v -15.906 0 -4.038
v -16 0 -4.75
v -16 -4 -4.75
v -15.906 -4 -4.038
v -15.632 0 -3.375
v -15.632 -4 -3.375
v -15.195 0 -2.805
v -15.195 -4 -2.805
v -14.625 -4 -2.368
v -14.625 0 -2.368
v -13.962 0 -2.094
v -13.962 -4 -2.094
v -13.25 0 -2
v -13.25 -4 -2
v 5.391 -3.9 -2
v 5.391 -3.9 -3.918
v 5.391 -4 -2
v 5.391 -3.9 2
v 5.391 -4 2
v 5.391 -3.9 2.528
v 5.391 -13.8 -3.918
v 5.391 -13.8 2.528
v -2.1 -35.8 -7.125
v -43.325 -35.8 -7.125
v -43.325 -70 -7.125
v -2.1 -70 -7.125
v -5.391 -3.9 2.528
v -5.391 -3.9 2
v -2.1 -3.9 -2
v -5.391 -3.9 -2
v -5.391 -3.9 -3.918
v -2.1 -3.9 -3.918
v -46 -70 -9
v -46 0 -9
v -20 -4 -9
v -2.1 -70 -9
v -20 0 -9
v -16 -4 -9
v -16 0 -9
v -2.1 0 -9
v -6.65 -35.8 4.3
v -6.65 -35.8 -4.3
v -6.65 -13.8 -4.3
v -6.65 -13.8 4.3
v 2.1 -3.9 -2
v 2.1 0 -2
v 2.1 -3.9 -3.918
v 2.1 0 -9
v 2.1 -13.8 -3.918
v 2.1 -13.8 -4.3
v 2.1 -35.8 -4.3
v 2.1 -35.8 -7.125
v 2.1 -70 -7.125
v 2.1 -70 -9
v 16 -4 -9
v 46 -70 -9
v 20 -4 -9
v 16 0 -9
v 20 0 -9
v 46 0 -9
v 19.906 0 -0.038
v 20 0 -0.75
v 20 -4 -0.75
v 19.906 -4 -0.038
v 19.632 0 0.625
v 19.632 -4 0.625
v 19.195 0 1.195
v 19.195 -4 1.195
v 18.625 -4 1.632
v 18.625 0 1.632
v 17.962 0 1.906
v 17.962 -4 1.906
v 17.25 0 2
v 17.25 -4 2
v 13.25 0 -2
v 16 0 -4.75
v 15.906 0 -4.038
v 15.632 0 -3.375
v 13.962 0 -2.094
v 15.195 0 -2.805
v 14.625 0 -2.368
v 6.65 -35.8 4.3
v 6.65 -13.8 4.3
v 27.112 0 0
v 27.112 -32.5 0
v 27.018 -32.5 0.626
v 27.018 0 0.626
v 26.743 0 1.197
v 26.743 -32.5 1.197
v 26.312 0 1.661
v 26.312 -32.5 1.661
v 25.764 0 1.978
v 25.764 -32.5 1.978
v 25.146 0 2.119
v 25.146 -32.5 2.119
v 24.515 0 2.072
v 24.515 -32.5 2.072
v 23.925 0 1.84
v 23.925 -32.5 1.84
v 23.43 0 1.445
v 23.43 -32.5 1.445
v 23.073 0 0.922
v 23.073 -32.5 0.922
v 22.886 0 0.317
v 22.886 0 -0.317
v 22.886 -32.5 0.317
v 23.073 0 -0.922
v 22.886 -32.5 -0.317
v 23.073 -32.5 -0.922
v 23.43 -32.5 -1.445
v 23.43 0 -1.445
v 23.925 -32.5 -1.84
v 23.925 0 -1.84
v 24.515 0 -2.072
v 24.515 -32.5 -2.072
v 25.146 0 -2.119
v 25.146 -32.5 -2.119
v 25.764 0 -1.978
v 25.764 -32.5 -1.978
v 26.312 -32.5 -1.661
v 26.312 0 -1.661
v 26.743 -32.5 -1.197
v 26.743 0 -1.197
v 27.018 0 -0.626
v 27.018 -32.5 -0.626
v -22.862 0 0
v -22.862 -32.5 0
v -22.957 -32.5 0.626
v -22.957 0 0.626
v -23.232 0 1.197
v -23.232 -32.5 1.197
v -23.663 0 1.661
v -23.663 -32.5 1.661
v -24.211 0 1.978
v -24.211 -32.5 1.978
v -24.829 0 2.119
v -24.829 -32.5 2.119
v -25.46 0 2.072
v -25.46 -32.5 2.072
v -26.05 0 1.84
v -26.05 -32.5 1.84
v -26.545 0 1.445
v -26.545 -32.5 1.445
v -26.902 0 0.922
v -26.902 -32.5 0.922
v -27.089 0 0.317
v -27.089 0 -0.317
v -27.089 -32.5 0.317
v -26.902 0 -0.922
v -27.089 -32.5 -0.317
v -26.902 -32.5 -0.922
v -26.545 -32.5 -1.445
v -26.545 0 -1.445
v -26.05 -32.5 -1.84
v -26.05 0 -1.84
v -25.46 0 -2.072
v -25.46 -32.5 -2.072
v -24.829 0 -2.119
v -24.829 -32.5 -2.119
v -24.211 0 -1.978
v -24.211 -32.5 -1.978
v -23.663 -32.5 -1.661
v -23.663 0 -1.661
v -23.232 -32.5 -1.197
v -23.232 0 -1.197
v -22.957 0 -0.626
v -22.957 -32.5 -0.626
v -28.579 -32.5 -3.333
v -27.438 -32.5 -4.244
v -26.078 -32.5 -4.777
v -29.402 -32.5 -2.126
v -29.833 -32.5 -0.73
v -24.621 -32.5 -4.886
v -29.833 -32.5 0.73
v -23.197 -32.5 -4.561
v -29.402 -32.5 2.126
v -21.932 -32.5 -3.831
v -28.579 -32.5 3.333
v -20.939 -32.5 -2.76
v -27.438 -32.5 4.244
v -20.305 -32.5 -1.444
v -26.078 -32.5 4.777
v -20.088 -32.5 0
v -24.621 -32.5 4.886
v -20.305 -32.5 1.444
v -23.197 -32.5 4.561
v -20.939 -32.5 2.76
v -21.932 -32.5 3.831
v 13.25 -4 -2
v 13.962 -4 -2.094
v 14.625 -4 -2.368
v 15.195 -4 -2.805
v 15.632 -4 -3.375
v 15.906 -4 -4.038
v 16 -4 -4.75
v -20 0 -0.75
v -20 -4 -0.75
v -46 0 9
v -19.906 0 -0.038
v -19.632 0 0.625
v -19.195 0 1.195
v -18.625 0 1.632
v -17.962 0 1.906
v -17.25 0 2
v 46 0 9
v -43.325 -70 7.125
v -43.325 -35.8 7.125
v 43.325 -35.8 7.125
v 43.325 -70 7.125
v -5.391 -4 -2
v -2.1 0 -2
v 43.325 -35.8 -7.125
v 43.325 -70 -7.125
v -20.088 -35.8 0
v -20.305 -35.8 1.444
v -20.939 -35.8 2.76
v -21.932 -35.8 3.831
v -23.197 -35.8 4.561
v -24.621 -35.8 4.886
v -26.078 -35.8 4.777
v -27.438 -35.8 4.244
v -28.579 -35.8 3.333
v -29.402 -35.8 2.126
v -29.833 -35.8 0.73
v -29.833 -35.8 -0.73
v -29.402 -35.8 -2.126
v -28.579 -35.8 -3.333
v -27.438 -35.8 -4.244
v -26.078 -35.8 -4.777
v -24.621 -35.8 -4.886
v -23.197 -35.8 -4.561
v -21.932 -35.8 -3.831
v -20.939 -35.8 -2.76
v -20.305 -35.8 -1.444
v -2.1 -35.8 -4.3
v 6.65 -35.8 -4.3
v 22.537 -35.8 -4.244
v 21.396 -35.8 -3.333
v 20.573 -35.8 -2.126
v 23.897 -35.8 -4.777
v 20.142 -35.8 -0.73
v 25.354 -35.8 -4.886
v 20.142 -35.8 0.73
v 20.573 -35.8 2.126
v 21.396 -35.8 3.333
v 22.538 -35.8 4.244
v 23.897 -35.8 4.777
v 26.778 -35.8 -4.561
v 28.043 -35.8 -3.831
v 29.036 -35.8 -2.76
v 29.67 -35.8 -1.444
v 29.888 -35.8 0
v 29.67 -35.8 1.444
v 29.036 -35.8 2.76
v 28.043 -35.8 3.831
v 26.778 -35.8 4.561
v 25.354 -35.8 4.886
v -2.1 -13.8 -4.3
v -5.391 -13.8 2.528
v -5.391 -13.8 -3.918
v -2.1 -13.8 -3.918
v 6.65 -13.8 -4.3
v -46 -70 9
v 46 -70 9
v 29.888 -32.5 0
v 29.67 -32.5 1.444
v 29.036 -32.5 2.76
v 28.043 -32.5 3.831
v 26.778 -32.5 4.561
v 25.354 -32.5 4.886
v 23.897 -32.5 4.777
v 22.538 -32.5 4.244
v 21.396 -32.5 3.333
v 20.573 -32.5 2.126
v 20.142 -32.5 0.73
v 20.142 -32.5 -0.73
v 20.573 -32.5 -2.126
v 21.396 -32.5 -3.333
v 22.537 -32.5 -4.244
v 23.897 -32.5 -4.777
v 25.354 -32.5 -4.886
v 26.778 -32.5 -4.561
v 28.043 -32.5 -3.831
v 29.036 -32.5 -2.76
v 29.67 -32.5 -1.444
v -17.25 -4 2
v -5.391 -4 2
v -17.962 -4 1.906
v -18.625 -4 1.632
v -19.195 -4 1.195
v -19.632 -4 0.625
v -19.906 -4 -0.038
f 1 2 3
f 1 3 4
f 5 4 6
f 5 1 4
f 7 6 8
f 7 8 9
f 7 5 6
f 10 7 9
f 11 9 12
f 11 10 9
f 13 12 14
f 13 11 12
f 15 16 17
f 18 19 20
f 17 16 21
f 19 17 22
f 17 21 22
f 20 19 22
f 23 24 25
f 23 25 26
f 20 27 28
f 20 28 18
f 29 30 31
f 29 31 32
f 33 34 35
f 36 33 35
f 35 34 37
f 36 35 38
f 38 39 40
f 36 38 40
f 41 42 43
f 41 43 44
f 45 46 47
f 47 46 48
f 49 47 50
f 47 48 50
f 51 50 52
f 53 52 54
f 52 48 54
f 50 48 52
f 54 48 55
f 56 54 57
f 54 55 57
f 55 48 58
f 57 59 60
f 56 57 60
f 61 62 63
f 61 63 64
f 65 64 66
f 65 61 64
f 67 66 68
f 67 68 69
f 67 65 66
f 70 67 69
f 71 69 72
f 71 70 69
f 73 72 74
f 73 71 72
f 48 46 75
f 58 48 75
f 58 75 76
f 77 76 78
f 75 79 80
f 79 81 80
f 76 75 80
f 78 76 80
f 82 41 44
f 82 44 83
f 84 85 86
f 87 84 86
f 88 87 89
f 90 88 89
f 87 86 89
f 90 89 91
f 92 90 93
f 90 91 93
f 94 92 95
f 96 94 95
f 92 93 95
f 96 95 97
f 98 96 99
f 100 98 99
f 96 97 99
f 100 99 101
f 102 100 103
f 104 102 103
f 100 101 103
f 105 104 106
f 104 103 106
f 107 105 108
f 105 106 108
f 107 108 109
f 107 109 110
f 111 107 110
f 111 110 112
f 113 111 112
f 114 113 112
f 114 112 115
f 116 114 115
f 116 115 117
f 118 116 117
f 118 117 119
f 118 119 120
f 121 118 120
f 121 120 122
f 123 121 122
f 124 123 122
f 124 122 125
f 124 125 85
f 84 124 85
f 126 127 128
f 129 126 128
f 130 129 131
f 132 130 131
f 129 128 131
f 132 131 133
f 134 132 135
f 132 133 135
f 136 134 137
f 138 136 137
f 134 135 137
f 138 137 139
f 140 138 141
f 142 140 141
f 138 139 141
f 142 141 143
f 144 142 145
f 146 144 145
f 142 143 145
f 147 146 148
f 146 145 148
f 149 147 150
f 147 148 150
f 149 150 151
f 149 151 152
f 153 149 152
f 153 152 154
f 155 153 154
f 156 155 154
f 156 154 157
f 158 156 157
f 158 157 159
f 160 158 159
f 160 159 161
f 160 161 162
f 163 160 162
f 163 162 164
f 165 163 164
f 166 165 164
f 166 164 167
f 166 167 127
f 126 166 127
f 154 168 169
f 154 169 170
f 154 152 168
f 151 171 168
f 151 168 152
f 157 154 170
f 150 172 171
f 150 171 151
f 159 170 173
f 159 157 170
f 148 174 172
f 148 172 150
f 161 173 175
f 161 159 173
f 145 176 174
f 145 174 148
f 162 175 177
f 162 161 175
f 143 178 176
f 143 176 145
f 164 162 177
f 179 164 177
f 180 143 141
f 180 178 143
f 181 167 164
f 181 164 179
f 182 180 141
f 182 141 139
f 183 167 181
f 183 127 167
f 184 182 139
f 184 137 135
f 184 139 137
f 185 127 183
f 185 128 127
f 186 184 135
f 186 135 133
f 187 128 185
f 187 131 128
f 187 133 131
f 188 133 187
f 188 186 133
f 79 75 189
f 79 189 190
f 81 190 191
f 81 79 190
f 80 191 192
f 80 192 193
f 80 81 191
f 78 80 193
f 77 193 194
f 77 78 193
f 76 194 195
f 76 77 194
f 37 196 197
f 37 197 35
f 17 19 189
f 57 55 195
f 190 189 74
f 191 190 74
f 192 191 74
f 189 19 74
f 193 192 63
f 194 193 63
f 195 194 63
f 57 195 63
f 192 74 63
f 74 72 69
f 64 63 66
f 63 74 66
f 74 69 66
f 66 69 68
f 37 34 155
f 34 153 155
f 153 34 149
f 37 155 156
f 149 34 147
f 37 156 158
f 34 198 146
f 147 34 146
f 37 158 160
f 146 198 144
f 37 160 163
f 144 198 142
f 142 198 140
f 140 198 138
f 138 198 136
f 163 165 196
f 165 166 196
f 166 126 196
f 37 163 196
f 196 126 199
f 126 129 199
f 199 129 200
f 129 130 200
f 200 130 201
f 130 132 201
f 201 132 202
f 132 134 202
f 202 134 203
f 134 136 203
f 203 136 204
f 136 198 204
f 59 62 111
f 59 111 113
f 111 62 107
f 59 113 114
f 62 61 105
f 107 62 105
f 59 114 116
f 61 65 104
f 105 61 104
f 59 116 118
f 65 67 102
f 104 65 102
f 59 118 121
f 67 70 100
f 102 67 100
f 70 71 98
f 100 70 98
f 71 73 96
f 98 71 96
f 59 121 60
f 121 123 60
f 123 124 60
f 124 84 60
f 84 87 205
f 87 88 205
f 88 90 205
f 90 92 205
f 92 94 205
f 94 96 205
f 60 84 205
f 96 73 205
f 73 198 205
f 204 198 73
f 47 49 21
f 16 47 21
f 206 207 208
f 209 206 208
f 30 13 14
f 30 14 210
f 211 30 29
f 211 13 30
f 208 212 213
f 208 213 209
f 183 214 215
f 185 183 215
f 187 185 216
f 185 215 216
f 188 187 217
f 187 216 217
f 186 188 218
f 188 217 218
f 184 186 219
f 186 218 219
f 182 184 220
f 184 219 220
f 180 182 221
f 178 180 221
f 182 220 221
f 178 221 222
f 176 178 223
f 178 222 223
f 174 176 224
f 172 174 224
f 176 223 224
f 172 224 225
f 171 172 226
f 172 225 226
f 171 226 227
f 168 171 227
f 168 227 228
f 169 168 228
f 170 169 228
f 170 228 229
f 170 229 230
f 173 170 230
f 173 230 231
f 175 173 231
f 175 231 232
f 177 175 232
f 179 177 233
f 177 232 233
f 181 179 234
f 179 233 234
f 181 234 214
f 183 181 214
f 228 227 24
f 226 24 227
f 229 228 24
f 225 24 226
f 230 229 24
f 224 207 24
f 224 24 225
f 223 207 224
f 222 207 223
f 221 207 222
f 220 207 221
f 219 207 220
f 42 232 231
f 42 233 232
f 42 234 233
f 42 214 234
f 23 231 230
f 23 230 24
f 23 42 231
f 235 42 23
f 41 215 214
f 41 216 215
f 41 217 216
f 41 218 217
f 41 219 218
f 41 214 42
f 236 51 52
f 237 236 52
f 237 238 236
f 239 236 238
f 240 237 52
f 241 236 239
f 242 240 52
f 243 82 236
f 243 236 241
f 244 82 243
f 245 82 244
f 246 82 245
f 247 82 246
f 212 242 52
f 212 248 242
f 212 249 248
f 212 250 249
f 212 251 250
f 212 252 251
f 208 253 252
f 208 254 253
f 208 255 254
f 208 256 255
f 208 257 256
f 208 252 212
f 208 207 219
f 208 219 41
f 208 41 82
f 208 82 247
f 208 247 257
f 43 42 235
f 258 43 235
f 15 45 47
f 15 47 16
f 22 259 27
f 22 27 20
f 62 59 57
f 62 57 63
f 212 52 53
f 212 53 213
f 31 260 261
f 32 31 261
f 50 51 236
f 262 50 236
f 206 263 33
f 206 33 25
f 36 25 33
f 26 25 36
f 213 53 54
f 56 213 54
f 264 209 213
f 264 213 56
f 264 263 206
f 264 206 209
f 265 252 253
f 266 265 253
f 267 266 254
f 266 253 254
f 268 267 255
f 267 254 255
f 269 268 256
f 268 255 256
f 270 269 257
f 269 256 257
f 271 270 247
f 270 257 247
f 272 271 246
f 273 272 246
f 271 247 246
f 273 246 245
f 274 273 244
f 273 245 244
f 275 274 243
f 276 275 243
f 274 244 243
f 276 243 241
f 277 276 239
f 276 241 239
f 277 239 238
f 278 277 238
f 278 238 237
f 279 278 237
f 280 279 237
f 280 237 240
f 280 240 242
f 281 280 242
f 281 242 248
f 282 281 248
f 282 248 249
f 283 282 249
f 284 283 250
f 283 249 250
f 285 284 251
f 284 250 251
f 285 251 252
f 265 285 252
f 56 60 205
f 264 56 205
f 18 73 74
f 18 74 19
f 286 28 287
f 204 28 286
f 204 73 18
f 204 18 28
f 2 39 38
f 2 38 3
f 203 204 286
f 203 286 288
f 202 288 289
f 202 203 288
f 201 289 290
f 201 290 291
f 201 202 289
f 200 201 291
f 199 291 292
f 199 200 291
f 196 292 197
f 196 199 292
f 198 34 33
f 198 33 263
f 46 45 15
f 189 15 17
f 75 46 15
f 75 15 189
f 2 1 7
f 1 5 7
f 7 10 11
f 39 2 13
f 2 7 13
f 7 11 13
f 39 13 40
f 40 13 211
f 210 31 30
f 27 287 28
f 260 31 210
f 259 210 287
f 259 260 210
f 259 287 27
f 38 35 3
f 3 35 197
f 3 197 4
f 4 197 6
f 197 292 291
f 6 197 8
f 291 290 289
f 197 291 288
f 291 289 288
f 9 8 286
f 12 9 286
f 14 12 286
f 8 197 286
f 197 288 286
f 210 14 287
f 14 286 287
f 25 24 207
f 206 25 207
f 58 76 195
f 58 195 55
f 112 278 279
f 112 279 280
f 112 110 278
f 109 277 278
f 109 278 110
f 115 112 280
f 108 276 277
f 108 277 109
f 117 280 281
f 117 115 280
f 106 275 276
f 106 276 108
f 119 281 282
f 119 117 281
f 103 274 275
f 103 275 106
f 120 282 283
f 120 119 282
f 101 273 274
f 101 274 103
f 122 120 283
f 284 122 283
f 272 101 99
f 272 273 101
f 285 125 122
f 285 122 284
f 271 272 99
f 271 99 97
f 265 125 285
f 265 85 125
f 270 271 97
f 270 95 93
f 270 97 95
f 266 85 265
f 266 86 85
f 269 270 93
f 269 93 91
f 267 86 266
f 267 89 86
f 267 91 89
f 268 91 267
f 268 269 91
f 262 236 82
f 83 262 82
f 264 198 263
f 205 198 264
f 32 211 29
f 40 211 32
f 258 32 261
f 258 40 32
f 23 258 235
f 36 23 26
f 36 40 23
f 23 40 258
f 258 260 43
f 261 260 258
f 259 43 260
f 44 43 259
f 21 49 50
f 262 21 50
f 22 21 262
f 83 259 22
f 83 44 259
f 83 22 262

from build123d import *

# Parameters (mm, degrees)
F0_W      = 92
F0_H      = 18
F0_W_2    = 86.65
F0_H_2    = 14.25
F1_DEPTH  = 70
F2_DEPTH  = 35.8
F4_W      = 13.3
F4_H      = 8.6
F5_DEPTH  = 22
F3_R      = 2
F6_DEPTH  = 8
F8_DEPTH  = 4
F9_W      = 10.7813365757
F9_H      = 6.4464779571
F9_R      = 3.2
F10_DEPTH = 9.9
F11_W     = 4.2
F11_H     = 70
F12_DEPTH = 8.9
F13_R     = 4.9
F13_R_2   = 2.125
F14_DEPTH = 3.3
F15_DEPTH = 44.7


with BuildPart() as f1:
    # F0 (on Front) → F1 (new body)
    with BuildSketch(Plane.XZ):
        Rectangle(F0_W, F0_H)
        Rectangle(F0_W_2, F0_H_2, mode=Mode.SUBTRACT)
    extrude(amount=F1_DEPTH)

    # F0 (on Front) → F2 (join)
    with BuildSketch(Plane.XZ):
        Rectangle(F0_W_2, F0_H_2)
    extrude(amount=F2_DEPTH)

    # F4 (on face) → F5 (cut)
    with BuildSketch(Plane.XZ.offset(35.8)):
        Rectangle(F4_W, F4_H)
    extrude(amount=-F5_DEPTH, mode=Mode.SUBTRACT)

    # F3 (on Front) → F6 (cut)
    with BuildSketch(Plane.XZ):
        Circle(F3_R)
    extrude(amount=F6_DEPTH, mode=Mode.SUBTRACT)

    # F7 (on Front) → F8 (cut)
    with BuildSketch(Plane.XZ):
        with BuildLine():
            ThreePointArc((-16, -4.75), (-15.1945436483, -2.8054563517), (-13.25, -2))
            Line((-13.25, -2), (13.25, -2))
            ThreePointArc((13.25, -2), (15.1945436483, -2.8054563517), (16, -4.75))
            Line((16, -4.75), (16, -9.8020741716))
            Line((16, -9.8020741716), (20, -9.8020741716))
            Line((20, -9.8020741716), (20, -2))
            Line((20, -2), (20, -0.75))
            ThreePointArc((20, -0.75), (19.1945436483, 1.1945436483), (17.25, 2))
            Line((17.25, 2), (16, 2))
            Line((16, 2), (-16, 2))
            Line((-16, 2), (-17.25, 2))
            ThreePointArc((-17.25, 2), (-19.1945436483, 1.1945436483), (-20, -0.75))
            Line((-20, -0.75), (-20, -2))
            Line((-20, -2), (-20, -11.9064366445))
            Line((-20, -11.9064366445), (-16, -11.9064366445))
            Line((-16, -11.9064366445), (-16, -4.75))
        make_face()
    extrude(amount=F8_DEPTH, mode=Mode.SUBTRACT)

    # F9 (on face) → F10 (cut)
    with BuildSketch(Plane.XZ.offset(13.8)):
        with Locations((0, -0.695)):
            Rectangle(F9_W, F9_H)
        with Locations((0, -0.695)):
            Circle(F9_R, mode=Mode.SUBTRACT)
        with Locations((0, -0.695)):
            Circle(F9_R)
    extrude(amount=-F10_DEPTH, mode=Mode.SUBTRACT)

    # F11 (on face) → F12 (cut)
    with BuildSketch(Plane(origin=(0, 0, -9), x_dir=(1, 0, 0), z_dir=(0, 0, -1))):
        with Locations((0, 35)):
            Rectangle(F11_W, F11_H)
    extrude(amount=-F12_DEPTH, mode=Mode.SUBTRACT)

    # F13 (on face) → F14 (cut)
    with BuildSketch(Plane.XZ.offset(35.8)):
        with Locations((24.9875, 0)):
            Circle(F13_R)
        with Locations((24.9875, 0)):
            Circle(F13_R_2, mode=Mode.SUBTRACT)
        with Locations((-24.9875, 0)):
            Circle(F13_R)
        with Locations((-24.9875, 0)):
            Circle(F13_R_2, mode=Mode.SUBTRACT)
        with Locations((-24.9875, 0)):
            Circle(F13_R_2)
        with Locations((24.9875, 0)):
            Circle(F13_R_2)
    extrude(amount=-F14_DEPTH, mode=Mode.SUBTRACT)

    # F13 (on face) → F15 (cut)
    with BuildSketch(Plane.XZ.offset(35.8)):
        with Locations((-24.9875, 0)):
            Circle(F13_R_2)
        with Locations((24.9875, 0)):
            Circle(F13_R_2)
    extrude(amount=-F15_DEPTH, mode=Mode.SUBTRACT)


solid = f1.part
